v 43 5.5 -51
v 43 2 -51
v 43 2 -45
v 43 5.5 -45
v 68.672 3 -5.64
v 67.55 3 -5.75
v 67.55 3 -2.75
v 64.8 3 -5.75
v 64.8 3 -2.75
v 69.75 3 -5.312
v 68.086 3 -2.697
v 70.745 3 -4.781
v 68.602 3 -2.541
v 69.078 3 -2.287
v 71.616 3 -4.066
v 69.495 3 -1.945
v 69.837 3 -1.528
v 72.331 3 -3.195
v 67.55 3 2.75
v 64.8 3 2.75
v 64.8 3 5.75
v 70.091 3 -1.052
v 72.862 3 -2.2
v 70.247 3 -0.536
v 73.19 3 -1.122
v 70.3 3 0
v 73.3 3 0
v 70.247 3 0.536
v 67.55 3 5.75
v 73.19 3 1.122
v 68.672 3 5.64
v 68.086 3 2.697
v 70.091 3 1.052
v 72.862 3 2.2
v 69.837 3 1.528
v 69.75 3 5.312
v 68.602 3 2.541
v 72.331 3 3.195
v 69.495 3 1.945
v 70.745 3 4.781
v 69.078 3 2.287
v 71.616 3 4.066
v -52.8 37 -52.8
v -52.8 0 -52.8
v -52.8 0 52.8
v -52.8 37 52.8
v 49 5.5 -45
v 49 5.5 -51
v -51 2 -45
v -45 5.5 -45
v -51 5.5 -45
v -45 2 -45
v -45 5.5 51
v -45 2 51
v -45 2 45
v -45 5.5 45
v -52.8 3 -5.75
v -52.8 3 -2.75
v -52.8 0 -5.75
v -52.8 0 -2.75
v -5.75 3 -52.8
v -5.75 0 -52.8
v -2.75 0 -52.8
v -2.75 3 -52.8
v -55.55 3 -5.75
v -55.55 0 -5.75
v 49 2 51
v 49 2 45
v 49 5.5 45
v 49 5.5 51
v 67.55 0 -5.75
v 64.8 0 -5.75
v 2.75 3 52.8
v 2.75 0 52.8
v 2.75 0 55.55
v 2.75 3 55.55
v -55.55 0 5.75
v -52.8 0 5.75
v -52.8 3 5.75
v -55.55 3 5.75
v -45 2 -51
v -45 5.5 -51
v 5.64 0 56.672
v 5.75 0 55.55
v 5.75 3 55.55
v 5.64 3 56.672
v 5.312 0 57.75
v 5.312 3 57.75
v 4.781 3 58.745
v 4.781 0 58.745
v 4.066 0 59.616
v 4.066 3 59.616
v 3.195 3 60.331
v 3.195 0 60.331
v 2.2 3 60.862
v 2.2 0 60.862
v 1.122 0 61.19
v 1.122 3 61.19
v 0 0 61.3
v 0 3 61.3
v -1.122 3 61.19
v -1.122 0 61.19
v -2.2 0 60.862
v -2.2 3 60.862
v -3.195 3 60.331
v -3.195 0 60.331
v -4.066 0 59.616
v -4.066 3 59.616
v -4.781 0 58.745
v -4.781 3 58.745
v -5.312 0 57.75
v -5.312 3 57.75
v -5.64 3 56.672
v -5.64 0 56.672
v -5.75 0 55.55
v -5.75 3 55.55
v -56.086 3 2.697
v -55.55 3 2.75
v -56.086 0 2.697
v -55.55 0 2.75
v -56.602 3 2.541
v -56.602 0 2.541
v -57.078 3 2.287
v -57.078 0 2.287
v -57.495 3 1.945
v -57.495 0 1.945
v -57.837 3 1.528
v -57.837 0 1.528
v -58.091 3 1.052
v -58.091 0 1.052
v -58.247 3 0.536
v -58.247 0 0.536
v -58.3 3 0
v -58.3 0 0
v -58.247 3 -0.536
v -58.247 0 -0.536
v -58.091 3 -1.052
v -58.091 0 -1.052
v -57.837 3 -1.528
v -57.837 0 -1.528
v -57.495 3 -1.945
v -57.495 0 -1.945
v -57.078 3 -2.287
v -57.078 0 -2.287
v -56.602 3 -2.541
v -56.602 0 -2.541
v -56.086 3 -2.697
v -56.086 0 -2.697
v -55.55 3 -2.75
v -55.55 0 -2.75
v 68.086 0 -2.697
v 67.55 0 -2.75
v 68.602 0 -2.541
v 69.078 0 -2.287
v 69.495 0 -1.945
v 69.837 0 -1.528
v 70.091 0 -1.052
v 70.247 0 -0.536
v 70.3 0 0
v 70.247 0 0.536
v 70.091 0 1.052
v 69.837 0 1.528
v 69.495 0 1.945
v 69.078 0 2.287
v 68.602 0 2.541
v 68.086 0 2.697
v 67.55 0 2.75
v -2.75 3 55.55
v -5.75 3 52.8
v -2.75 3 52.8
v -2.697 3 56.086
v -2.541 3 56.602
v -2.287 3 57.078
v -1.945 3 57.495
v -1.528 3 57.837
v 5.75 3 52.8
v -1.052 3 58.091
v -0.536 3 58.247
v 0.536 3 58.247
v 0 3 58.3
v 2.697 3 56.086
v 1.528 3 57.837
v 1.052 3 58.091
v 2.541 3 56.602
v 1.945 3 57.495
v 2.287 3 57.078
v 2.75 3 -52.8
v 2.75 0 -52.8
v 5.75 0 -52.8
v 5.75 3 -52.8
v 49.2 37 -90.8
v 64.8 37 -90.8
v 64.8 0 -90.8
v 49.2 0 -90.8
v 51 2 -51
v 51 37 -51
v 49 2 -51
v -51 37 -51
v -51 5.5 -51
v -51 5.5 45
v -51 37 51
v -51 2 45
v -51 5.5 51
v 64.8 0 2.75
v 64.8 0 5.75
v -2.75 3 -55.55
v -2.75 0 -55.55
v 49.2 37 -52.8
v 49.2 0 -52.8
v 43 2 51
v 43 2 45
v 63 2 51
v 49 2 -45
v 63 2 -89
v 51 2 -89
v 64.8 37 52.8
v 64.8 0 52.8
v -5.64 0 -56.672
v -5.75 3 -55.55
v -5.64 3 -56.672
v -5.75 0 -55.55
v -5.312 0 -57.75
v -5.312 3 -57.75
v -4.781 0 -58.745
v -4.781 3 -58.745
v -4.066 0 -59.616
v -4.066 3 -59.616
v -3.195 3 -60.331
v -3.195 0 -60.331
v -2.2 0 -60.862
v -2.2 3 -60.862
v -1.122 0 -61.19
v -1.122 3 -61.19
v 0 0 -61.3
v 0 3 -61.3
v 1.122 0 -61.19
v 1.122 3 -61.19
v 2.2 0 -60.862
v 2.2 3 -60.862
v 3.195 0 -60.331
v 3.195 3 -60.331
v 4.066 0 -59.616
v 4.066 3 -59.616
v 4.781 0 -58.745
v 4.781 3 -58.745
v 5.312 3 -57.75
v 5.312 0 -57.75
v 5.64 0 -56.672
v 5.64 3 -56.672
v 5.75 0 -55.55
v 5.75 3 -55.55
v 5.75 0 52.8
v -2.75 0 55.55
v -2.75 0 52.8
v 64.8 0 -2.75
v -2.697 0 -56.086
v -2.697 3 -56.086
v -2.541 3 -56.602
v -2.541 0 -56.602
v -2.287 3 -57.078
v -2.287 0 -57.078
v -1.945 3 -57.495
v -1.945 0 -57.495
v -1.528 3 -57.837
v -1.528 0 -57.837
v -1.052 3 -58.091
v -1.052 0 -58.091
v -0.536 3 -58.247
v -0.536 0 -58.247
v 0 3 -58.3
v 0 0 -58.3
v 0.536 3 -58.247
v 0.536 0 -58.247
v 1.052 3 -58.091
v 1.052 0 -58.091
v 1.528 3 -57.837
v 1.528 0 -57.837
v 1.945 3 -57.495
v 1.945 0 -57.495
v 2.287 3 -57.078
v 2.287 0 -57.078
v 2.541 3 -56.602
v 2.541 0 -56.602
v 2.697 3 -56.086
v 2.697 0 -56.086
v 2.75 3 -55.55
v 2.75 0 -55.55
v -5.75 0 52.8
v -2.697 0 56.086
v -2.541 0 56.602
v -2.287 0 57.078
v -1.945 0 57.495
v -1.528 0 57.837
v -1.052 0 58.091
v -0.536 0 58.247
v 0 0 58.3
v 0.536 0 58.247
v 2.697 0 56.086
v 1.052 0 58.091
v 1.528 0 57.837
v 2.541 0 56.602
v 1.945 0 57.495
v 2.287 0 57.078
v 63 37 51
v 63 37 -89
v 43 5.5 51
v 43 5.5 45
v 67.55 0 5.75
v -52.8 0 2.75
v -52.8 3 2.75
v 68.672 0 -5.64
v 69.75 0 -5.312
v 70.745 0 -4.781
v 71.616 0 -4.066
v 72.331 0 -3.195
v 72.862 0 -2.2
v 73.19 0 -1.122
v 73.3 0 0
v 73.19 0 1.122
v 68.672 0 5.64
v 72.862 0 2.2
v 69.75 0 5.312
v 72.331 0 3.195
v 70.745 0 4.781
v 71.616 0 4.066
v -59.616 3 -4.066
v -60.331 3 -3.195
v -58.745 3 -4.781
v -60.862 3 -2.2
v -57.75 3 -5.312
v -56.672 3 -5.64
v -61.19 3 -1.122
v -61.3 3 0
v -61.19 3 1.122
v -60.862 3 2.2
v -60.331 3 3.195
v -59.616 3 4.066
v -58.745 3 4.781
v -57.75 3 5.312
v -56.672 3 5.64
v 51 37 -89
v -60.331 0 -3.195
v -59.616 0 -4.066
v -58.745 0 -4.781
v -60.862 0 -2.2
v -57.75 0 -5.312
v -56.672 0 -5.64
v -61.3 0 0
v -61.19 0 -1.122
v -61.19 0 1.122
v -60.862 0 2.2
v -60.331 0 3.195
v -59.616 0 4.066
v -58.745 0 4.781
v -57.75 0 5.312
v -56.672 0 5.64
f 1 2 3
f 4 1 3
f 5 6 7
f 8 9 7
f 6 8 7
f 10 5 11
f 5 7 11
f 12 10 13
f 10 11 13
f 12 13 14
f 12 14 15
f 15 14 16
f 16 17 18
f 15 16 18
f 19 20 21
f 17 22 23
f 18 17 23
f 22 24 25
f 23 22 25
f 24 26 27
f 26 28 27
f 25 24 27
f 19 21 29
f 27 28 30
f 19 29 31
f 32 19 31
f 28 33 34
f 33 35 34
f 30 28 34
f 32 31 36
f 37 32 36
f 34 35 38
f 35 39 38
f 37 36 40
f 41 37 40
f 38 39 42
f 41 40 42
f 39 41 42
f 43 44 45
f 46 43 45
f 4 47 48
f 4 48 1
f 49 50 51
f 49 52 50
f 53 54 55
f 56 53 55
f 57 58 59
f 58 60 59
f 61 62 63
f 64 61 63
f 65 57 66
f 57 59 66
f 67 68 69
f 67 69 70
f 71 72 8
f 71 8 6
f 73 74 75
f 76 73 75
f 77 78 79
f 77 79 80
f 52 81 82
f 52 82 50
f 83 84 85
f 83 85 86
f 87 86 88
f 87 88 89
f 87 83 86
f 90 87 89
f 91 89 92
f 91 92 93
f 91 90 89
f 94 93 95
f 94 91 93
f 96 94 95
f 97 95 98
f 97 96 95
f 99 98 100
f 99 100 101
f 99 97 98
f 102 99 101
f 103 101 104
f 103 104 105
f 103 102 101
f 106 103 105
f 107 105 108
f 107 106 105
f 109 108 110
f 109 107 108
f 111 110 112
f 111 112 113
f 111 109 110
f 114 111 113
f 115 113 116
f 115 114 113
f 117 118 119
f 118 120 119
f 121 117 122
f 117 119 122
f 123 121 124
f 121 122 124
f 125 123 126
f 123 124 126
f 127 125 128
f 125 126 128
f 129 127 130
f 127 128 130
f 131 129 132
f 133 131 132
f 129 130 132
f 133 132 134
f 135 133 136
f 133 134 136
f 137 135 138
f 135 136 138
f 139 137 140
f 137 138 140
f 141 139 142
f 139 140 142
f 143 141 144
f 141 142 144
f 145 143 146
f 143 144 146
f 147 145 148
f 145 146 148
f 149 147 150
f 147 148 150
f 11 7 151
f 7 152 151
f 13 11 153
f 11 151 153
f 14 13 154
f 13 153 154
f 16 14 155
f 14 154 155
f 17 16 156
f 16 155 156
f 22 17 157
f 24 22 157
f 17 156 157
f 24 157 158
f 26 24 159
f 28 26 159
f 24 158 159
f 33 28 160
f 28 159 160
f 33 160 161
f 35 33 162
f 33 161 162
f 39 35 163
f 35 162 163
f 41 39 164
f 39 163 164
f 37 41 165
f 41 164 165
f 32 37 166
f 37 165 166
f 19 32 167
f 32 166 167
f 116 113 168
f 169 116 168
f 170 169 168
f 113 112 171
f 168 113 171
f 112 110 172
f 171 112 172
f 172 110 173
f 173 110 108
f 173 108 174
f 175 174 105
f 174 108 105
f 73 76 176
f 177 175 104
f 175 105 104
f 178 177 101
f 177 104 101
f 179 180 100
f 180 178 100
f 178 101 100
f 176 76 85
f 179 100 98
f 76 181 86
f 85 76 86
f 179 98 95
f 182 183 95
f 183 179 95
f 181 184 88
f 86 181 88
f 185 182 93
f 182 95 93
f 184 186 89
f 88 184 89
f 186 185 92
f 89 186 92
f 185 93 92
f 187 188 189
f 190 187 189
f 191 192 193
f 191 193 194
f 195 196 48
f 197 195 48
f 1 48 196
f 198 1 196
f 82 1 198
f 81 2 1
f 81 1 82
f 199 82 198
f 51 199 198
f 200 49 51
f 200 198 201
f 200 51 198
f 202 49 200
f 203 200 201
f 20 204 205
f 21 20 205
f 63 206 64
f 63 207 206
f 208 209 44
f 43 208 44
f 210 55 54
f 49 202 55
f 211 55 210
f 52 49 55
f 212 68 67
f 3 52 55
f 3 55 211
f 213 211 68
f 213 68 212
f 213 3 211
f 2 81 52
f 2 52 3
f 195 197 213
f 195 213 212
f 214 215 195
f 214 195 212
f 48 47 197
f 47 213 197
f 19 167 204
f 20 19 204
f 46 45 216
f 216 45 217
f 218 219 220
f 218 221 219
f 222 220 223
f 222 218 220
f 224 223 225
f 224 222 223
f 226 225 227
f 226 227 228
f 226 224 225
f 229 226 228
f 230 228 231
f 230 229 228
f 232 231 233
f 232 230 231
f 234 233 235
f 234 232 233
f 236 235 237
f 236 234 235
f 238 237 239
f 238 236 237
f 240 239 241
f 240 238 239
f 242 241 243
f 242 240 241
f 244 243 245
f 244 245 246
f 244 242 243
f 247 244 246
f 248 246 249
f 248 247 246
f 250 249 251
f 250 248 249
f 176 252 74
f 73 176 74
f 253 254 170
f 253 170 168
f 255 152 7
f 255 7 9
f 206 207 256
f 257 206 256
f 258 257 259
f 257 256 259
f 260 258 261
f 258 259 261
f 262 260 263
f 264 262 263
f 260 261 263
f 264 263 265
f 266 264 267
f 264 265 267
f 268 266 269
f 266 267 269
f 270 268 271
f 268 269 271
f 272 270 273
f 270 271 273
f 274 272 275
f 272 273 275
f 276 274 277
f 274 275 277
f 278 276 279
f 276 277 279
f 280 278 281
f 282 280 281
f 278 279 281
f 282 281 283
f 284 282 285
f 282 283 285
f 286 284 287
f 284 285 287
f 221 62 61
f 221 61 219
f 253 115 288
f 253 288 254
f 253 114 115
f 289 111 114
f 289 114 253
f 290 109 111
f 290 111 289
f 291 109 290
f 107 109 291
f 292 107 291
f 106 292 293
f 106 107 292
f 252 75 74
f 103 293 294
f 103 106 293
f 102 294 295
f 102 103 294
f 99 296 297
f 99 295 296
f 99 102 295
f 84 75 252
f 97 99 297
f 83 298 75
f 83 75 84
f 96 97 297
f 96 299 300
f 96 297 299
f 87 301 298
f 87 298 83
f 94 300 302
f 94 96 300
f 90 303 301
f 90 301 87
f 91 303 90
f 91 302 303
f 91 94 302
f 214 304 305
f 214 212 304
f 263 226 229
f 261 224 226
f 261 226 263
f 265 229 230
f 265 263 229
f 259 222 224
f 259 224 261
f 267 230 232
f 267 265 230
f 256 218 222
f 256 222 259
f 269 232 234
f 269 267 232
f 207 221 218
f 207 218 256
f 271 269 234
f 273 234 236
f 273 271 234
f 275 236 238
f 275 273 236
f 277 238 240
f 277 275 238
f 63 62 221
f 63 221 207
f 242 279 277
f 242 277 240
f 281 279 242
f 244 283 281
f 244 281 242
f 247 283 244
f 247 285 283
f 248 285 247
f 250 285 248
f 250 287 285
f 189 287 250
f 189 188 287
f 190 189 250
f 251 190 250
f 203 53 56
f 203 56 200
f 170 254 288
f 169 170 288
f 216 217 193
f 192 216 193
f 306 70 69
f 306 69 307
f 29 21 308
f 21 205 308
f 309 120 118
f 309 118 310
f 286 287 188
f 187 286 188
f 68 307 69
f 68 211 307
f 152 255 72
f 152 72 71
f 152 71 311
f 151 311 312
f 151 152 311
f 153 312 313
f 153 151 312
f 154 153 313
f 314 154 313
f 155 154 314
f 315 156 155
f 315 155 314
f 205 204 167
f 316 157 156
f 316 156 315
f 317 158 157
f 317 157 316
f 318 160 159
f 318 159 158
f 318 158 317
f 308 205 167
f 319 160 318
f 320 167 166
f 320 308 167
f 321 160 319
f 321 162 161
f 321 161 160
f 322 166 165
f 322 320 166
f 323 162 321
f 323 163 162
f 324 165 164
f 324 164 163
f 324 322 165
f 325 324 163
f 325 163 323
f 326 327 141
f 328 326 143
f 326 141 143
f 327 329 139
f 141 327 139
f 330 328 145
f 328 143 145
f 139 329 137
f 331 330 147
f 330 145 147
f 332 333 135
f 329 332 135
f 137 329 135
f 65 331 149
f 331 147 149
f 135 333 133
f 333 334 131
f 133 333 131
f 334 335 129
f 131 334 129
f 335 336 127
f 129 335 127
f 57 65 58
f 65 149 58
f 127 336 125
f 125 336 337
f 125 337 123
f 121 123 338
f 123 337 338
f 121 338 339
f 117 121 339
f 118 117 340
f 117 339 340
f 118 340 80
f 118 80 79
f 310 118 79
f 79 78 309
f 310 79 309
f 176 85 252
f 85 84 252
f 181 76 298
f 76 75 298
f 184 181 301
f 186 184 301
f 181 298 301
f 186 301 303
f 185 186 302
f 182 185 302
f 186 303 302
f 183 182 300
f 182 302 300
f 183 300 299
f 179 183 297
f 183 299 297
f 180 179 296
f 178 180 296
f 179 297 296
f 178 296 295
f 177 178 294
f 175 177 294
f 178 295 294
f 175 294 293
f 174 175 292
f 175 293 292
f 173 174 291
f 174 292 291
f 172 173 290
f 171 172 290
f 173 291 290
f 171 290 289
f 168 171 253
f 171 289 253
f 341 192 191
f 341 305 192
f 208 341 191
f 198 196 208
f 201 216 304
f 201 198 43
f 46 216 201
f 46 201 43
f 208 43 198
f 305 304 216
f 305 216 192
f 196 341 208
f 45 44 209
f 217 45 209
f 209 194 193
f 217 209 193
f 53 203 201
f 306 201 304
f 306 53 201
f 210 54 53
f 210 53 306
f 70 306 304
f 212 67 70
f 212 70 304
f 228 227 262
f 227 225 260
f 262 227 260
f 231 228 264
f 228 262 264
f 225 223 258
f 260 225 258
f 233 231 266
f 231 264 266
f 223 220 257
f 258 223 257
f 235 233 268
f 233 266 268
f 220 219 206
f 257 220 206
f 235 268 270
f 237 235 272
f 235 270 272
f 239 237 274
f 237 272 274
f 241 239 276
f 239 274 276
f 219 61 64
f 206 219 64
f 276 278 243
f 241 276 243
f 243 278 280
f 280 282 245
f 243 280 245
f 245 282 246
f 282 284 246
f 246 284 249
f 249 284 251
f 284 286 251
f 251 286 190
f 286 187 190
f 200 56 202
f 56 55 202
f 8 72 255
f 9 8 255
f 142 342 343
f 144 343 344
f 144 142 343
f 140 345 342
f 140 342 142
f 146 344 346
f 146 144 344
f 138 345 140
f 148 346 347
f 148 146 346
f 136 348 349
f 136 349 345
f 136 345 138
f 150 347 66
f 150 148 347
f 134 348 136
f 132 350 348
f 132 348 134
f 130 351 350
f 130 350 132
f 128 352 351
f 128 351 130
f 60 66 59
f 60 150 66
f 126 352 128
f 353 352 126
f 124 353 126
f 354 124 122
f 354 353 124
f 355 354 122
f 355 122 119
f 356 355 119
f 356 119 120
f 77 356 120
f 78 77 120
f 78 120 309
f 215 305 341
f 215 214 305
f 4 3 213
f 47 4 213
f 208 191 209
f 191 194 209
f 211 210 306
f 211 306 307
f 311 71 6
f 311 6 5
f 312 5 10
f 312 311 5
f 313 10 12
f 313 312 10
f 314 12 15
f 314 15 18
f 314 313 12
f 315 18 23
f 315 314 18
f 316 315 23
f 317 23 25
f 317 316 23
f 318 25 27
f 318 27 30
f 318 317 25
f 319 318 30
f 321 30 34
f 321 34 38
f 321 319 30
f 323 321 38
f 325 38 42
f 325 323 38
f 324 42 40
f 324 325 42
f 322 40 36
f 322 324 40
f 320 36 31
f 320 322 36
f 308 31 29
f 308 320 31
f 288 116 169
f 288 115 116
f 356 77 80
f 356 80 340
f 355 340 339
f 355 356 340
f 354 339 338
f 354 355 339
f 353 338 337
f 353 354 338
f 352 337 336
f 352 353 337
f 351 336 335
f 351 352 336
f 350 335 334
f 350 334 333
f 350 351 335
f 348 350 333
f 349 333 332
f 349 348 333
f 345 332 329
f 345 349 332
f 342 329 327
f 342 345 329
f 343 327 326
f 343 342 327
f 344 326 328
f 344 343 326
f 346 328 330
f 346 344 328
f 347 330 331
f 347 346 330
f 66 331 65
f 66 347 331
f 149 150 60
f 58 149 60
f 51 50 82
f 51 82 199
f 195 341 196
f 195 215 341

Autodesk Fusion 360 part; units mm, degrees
sketch "Sketch2" plane through (0, 0, 0) normal (0, 1, 0) x (1, 0, 0)
  line L0 (-51, 51) -> (-51, -51)
  line L1 (-51, -51) -> (63, -51)
  line L2 (63, -51) -> (63, 89)
  line L3 (63, 89) -> (51, 89)
  line L4 (51, 89) -> (51, 51)
  line L5 (51, 51) -> (-51, 51)
  dimension "d11" = 51
  dimension "d12" = 102
  dimension "d13" = 51
  dimension "d14" = 12
  dimension "d15" = 140
  dimension "d33" = 102
extrude "Extrude2" add sketch "Sketch2" along normal blind 2 makes body 1
sketch "Sketch3" plane through (0, 2, 0) normal (0, 1, 0) x (-1, 0, 0)
  line L0 (-51, -51) -> (51, -51)
  line L1 (51, -51) -> (51, 51)
  line L2 (51, 51) -> (-63, 51)
  line L3 (-63, 51) -> (-63, -89)
  line L4 (-63, -89) -> (-51, -89)
  line L5 (-51, -89) -> (-51, -51)
  line L6 (52.8, 52.8) -> (-64.8, 52.8)
  line L7 (-64.8, 52.8) -> (-64.8, -90.8)
  line L8 (-64.8, -90.8) -> (-49.2, -90.8)
  line L9 (-49.2, -90.8) -> (-49.2, -52.8)
  line L10 (-49.2, -52.8) -> (52.8, -52.8)
  line L11 (52.8, -52.8) -> (52.8, 52.8)
  dimension "d21" = 1.8
extrude "Extrude3" add sketch "Sketch3" along normal blind 35 and the other way blind 2 bodies 1
sketch "Sketch4" plane through (0, 2, 0) normal (0, 1, 0) x (-1, 0, 0)
  line L0 (-51, -51) -> (51, -51)
  line L1 (51, -51) -> (51, 51)
  line L2 (-63, -89) -> (-51, -89)
  line L3 (-51, -89) -> (-51, -51)
  line L4 (51, -51) -> (45, -51)
  line L5 (45, -51) -> (45, -45)
  line L6 (45, -45) -> (51, -45)
  line L7 (51, -45) -> (51, -51)
  line L8 (51, 51) -> (45, 51)
  line L9 (45, 51) -> (45, 45)
  line L10 (45, 45) -> (51, 45)
  line L11 (51, 45) -> (51, 51)
  line L12 (-43, -45) -> (-49, -45)
  line L13 (-49, -45) -> (-49, -51)
  line L14 (-49, -51) -> (-43, -51)
  line L15 (-43, -51) -> (-43, -45)
  line L16 (-43, 45) -> (-49, 45)
  line L17 (-49, 45) -> (-49, 51)
  line L18 (-49, 51) -> (-43, 51)
  line L19 (-43, 51) -> (-43, 45)
  dimension "d24" = 6
  dimension "d25" = 6
  dimension "d26" = 6
  dimension "d27" = 6
  dimension "d30" = 6
  dimension "d31" = 6
  dimension "d32" = 100
  dimension "d34" = 6
  dimension "d35" = 6
  dimension "d36" = 100
extrude "Extrude4" add sketch "Sketch4" along normal blind 3.5 bodies 1
sketch "Sketch5" plane through (0, 0, 0) normal (0, -1, 0) x (1, 0, 0)
  line L0 (-52.8, 52.8) -> (-52.8, -52.8)
  line L1 (-52.8, -52.8) -> (49.2, -52.8)
  line L2 (49.2, -52.8) -> (49.2, -90.8)
  line L3 (49.2, -90.8) -> (64.8, -90.8)
  line L4 (64.8, -90.8) -> (64.8, 52.8)
  line L5 (64.8, 52.8) -> (-52.8, 52.8)
  line L6 (-5.75, 52.8) -> (-2.75, 52.8)
  line L7 (-2.75, 52.8) -> (-2.75, 55.55)
  line L8 (-2.75, 55.55) -> (-5.75, 55.55)
  line L9 (-5.75, 55.55) -> (-5.75, 52.8)
  line L10 (5.75, 52.8) -> (2.75, 52.8)
  line L11 (2.75, 52.8) -> (2.75, 55.55)
  line L12 (2.75, 55.55) -> (5.75, 55.55)
  line L13 (5.75, 55.55) -> (5.75, 52.8)
  circle A0 centre (0, 55.55) radius 5.75
  circle A1 centre (0, 55.55) radius 2.75
  line L14 (-55.55, 5.75) -> (-55.55, 2.75)
  line L15 (-52.8, 5.75) -> (-55.55, 5.75)
  circle A2 centre (-55.55, 0) radius 2.75
  circle A3 centre (-55.55, 0) radius 5.75
  line L16 (-55.55, 2.75) -> (-52.8, 2.75)
  line L17 (-52.8, 2.75) -> (-52.8, 5.75)
  line L18 (-52.8, -5.75) -> (-55.55, -5.75)
  line L19 (-55.55, -2.75) -> (-52.8, -2.75)
  line L20 (-52.8, -2.75) -> (-52.8, -5.75)
  line L21 (-55.55, -5.75) -> (-55.55, -2.75)
  line L22 (64.8, -5.75) -> (67.55, -5.75)
  line L23 (64.8, 5.75) -> (67.55, 5.75)
  circle A4 centre (67.55, 0) radius 2.75
  line L24 (64.8, -2.75) -> (64.8, -5.75)
  line L25 (67.55, -2.75) -> (64.8, -2.75)
  line L26 (67.55, 2.75) -> (64.8, 2.75)
  line L27 (67.55, 5.75) -> (67.55, 2.75)
  line L28 (64.8, 2.75) -> (64.8, 5.75)
  circle A5 centre (67.55, 0) radius 5.75
  line L29 (67.55, -5.75) -> (67.55, -2.75)
  line L30 (2.75, -52.8) -> (5.75, -52.8)
  line L31 (-2.75, -52.8) -> (-5.75, -52.8)
  line L32 (-2.75, -55.55) -> (-2.75, -52.8)
  line L33 (-5.75, -52.8) -> (-5.75, -55.55)
  line L34 (5.75, -55.55) -> (2.75, -55.55)
  line L35 (-5.75, -55.55) -> (-2.75, -55.55)
  line L36 (2.75, -55.55) -> (2.75, -52.8)
  circle A6 centre (0, -55.55) radius 2.75
  line L37 (5.75, -52.8) -> (5.75, -55.55)
  circle A7 centre (0, -55.55) radius 5.75
  dimension "d39" = 3
  dimension "d40" = 3
  dimension "d41" = 5.5
  dimension "d42" = 5.5
  dimension "d56" = 5.5
  dimension "d57" = 3
  dimension "d62" = 2.75
  dimension "d64" = 2.75
  dimension "d66" = 5.5
  dimension "d67" = 3
  dimension "d68" = 5.5
  dimension "d69" = 3
  dimension "d70" = 2.75
  dimension "d71" = 2.75
extrude "Extrude5" add sketch "Sketch5" against normal blind 3 separate body contours L0 L15 A3 L17 | L5 L6 L9 A0 | L0 L14 A3 L16 L17 | L14 A2 A3 L21 | L5 L6 L7 L8 A0 | L8 L12 A0 A1 | L0 A3 L19 L20 L21 | L0 A3 L18 L20 | L5 L10 L13 A0 | L5 L10 L11 L12 A0 | L1 L31 L33 A7 | L4 L23 L28 A5 | L1 L31 L32 L35 A7 | L34 L35 A6 A7 | L4 L26 L27 L28 A5 | A4 L27 A5 L29 | L1 L30 L34 L36 A7 | L1 L30 L37 A7 | L4 L22 L24 A5 | L4 L24 L25 A5 L29 makes body 2 at (-4.75, 0, 54.6333) makes body 3 at (-53.7167, 0, -3.75) makes body 4 at (65.7167, 0, 3.75) makes body 5 at (3.75, 0, -54.6333)
equation "d10 = 102 mm"
equation "d11 = d10 / 2"
equation "d13 = d12 / 2"
equation "d21 = ( 0.6 * 3 ) * 1 mm"
equation "d40 = d39"
equation "d42 = d41"
equation "d48 = 5.5 mm"
equation "d56 = d48"
equation "d57 = d39"
equation "d64 = d62"
equation "d66 = d48"
equation "d67 = d39"
equation "d68 = d48"
equation "d69 = d39"
equation "d70 = d62"
equation "d71 = d62"
